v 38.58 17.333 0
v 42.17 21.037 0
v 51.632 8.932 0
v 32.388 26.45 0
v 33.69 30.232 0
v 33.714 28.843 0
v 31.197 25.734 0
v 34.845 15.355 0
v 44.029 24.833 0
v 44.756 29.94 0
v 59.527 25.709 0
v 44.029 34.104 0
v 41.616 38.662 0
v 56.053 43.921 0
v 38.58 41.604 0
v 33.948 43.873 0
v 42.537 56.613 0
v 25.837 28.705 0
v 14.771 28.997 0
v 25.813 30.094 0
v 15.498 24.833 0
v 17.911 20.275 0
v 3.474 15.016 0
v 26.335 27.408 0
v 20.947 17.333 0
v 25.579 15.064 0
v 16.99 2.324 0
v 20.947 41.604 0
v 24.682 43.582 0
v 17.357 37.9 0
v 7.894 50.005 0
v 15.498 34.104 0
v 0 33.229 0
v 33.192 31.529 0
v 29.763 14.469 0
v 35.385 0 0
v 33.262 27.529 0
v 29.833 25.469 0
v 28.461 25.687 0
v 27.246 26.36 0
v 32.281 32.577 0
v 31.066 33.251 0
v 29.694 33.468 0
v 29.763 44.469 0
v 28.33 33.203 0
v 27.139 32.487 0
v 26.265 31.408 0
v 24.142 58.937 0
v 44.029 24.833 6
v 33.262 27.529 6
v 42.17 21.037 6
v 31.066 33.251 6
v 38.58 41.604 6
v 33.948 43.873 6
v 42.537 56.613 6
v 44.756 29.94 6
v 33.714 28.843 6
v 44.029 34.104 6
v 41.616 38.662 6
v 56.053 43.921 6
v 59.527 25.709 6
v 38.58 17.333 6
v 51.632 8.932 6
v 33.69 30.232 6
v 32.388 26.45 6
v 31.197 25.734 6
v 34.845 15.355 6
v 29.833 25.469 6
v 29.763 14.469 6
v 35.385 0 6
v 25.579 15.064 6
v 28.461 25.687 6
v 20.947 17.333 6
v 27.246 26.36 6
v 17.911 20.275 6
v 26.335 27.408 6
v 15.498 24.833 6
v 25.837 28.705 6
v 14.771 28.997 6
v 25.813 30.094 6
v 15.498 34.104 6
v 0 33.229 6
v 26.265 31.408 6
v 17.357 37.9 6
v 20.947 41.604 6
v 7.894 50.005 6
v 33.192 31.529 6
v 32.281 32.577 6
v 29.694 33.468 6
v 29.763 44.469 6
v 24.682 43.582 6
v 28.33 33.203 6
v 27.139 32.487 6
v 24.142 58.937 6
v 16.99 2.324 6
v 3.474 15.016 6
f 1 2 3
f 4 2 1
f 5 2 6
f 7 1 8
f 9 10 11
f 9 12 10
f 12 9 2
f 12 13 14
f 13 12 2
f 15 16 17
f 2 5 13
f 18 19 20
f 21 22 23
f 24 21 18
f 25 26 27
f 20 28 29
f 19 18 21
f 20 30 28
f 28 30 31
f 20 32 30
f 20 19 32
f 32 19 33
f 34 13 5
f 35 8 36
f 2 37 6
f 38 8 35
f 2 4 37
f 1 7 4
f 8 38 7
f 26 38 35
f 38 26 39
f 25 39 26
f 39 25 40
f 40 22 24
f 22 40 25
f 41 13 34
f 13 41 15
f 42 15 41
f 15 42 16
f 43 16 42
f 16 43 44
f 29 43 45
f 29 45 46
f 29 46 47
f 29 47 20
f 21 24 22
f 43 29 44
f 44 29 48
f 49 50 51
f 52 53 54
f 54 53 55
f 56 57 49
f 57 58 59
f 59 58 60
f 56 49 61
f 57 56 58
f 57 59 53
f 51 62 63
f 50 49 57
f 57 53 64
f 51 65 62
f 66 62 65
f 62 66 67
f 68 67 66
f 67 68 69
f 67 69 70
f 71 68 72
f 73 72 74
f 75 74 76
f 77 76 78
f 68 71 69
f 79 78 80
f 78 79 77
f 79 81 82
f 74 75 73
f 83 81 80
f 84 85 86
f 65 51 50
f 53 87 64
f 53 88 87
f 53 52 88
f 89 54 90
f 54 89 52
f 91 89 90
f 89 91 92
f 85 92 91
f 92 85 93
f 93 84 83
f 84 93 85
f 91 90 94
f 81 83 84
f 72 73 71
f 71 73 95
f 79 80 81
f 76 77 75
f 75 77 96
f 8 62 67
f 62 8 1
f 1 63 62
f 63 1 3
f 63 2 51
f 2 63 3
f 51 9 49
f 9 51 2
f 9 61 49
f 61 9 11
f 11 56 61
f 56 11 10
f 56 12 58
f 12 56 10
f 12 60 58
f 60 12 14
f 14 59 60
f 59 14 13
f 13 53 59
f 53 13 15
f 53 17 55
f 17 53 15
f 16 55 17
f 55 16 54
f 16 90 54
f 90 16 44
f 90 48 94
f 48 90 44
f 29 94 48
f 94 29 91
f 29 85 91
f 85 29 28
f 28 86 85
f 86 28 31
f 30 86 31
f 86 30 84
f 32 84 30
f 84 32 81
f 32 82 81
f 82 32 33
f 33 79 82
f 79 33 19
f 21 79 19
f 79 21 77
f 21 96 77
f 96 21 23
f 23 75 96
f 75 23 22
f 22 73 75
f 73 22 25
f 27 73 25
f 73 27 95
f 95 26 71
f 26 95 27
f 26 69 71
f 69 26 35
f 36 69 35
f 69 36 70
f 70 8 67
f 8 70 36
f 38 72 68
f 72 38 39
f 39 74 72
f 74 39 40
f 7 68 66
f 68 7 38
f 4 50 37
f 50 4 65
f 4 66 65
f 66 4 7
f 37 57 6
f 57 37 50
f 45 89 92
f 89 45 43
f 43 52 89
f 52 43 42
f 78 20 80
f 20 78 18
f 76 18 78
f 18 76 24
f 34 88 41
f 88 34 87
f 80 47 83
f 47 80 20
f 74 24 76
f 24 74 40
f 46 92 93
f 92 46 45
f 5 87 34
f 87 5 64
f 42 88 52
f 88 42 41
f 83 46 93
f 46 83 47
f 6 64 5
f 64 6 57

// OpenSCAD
$fn = 32;

// ----------------------------------------------------------------------
// Star wheel: 10-point ratchet, R30
// ----------------------------------------------------------------------

// --- parameters (mm) ---
n_points = 10;            // number of points / teeth
r_out = 30;               // tip radius
r_in = 15;                // root radius
bore_r = 4;               // centre bore radius
plate_t = 6;              // plate thickness, Z (extrusion height)
bore_d = 8;               // centre bore diameter

profile = [[29.763, 44.469], [24.142, 58.937], [24.682, 43.582], [20.947, 41.604], [7.894, 50.005], [17.357, 37.9], [15.498, 34.104], [0, 33.229], [14.771, 28.997], [15.498, 24.833], [3.474, 15.016], [17.911, 20.275], [20.947, 17.333], [16.99, 2.324], [25.579, 15.064], [29.763, 14.469], [35.385, 0], [34.845, 15.355], [38.58, 17.333], [51.632, 8.932], [42.17, 21.037], [44.029, 24.833], [59.527, 25.709], [44.756, 29.94], [44.029, 34.104], [56.053, 43.921], [41.616, 38.662], [38.58, 41.604], [42.537, 56.613], [33.948, 43.873]];  // primary outline, 30 points, counter clockwise
void_1 = [[33.69, 30.232], [33.192, 31.529], [32.281, 32.577], [31.066, 33.251], [29.694, 33.468], [28.33, 33.203], [27.139, 32.487], [26.265, 31.408], [25.813, 30.094], [25.837, 28.705], [26.335, 27.408], [27.246, 26.36], [28.461, 25.687], [29.833, 25.469], [31.197, 25.734], [32.388, 26.45], [33.262, 27.529], [33.714, 28.843]];  // centre bore, 18 points

// --- the one profile operation ---
difference() {
  linear_extrude(height = plate_t) polygon(points = profile);
  translate([0, 0, -1])
    linear_extrude(height = plate_t + 2) polygon(points = void_1);
}
